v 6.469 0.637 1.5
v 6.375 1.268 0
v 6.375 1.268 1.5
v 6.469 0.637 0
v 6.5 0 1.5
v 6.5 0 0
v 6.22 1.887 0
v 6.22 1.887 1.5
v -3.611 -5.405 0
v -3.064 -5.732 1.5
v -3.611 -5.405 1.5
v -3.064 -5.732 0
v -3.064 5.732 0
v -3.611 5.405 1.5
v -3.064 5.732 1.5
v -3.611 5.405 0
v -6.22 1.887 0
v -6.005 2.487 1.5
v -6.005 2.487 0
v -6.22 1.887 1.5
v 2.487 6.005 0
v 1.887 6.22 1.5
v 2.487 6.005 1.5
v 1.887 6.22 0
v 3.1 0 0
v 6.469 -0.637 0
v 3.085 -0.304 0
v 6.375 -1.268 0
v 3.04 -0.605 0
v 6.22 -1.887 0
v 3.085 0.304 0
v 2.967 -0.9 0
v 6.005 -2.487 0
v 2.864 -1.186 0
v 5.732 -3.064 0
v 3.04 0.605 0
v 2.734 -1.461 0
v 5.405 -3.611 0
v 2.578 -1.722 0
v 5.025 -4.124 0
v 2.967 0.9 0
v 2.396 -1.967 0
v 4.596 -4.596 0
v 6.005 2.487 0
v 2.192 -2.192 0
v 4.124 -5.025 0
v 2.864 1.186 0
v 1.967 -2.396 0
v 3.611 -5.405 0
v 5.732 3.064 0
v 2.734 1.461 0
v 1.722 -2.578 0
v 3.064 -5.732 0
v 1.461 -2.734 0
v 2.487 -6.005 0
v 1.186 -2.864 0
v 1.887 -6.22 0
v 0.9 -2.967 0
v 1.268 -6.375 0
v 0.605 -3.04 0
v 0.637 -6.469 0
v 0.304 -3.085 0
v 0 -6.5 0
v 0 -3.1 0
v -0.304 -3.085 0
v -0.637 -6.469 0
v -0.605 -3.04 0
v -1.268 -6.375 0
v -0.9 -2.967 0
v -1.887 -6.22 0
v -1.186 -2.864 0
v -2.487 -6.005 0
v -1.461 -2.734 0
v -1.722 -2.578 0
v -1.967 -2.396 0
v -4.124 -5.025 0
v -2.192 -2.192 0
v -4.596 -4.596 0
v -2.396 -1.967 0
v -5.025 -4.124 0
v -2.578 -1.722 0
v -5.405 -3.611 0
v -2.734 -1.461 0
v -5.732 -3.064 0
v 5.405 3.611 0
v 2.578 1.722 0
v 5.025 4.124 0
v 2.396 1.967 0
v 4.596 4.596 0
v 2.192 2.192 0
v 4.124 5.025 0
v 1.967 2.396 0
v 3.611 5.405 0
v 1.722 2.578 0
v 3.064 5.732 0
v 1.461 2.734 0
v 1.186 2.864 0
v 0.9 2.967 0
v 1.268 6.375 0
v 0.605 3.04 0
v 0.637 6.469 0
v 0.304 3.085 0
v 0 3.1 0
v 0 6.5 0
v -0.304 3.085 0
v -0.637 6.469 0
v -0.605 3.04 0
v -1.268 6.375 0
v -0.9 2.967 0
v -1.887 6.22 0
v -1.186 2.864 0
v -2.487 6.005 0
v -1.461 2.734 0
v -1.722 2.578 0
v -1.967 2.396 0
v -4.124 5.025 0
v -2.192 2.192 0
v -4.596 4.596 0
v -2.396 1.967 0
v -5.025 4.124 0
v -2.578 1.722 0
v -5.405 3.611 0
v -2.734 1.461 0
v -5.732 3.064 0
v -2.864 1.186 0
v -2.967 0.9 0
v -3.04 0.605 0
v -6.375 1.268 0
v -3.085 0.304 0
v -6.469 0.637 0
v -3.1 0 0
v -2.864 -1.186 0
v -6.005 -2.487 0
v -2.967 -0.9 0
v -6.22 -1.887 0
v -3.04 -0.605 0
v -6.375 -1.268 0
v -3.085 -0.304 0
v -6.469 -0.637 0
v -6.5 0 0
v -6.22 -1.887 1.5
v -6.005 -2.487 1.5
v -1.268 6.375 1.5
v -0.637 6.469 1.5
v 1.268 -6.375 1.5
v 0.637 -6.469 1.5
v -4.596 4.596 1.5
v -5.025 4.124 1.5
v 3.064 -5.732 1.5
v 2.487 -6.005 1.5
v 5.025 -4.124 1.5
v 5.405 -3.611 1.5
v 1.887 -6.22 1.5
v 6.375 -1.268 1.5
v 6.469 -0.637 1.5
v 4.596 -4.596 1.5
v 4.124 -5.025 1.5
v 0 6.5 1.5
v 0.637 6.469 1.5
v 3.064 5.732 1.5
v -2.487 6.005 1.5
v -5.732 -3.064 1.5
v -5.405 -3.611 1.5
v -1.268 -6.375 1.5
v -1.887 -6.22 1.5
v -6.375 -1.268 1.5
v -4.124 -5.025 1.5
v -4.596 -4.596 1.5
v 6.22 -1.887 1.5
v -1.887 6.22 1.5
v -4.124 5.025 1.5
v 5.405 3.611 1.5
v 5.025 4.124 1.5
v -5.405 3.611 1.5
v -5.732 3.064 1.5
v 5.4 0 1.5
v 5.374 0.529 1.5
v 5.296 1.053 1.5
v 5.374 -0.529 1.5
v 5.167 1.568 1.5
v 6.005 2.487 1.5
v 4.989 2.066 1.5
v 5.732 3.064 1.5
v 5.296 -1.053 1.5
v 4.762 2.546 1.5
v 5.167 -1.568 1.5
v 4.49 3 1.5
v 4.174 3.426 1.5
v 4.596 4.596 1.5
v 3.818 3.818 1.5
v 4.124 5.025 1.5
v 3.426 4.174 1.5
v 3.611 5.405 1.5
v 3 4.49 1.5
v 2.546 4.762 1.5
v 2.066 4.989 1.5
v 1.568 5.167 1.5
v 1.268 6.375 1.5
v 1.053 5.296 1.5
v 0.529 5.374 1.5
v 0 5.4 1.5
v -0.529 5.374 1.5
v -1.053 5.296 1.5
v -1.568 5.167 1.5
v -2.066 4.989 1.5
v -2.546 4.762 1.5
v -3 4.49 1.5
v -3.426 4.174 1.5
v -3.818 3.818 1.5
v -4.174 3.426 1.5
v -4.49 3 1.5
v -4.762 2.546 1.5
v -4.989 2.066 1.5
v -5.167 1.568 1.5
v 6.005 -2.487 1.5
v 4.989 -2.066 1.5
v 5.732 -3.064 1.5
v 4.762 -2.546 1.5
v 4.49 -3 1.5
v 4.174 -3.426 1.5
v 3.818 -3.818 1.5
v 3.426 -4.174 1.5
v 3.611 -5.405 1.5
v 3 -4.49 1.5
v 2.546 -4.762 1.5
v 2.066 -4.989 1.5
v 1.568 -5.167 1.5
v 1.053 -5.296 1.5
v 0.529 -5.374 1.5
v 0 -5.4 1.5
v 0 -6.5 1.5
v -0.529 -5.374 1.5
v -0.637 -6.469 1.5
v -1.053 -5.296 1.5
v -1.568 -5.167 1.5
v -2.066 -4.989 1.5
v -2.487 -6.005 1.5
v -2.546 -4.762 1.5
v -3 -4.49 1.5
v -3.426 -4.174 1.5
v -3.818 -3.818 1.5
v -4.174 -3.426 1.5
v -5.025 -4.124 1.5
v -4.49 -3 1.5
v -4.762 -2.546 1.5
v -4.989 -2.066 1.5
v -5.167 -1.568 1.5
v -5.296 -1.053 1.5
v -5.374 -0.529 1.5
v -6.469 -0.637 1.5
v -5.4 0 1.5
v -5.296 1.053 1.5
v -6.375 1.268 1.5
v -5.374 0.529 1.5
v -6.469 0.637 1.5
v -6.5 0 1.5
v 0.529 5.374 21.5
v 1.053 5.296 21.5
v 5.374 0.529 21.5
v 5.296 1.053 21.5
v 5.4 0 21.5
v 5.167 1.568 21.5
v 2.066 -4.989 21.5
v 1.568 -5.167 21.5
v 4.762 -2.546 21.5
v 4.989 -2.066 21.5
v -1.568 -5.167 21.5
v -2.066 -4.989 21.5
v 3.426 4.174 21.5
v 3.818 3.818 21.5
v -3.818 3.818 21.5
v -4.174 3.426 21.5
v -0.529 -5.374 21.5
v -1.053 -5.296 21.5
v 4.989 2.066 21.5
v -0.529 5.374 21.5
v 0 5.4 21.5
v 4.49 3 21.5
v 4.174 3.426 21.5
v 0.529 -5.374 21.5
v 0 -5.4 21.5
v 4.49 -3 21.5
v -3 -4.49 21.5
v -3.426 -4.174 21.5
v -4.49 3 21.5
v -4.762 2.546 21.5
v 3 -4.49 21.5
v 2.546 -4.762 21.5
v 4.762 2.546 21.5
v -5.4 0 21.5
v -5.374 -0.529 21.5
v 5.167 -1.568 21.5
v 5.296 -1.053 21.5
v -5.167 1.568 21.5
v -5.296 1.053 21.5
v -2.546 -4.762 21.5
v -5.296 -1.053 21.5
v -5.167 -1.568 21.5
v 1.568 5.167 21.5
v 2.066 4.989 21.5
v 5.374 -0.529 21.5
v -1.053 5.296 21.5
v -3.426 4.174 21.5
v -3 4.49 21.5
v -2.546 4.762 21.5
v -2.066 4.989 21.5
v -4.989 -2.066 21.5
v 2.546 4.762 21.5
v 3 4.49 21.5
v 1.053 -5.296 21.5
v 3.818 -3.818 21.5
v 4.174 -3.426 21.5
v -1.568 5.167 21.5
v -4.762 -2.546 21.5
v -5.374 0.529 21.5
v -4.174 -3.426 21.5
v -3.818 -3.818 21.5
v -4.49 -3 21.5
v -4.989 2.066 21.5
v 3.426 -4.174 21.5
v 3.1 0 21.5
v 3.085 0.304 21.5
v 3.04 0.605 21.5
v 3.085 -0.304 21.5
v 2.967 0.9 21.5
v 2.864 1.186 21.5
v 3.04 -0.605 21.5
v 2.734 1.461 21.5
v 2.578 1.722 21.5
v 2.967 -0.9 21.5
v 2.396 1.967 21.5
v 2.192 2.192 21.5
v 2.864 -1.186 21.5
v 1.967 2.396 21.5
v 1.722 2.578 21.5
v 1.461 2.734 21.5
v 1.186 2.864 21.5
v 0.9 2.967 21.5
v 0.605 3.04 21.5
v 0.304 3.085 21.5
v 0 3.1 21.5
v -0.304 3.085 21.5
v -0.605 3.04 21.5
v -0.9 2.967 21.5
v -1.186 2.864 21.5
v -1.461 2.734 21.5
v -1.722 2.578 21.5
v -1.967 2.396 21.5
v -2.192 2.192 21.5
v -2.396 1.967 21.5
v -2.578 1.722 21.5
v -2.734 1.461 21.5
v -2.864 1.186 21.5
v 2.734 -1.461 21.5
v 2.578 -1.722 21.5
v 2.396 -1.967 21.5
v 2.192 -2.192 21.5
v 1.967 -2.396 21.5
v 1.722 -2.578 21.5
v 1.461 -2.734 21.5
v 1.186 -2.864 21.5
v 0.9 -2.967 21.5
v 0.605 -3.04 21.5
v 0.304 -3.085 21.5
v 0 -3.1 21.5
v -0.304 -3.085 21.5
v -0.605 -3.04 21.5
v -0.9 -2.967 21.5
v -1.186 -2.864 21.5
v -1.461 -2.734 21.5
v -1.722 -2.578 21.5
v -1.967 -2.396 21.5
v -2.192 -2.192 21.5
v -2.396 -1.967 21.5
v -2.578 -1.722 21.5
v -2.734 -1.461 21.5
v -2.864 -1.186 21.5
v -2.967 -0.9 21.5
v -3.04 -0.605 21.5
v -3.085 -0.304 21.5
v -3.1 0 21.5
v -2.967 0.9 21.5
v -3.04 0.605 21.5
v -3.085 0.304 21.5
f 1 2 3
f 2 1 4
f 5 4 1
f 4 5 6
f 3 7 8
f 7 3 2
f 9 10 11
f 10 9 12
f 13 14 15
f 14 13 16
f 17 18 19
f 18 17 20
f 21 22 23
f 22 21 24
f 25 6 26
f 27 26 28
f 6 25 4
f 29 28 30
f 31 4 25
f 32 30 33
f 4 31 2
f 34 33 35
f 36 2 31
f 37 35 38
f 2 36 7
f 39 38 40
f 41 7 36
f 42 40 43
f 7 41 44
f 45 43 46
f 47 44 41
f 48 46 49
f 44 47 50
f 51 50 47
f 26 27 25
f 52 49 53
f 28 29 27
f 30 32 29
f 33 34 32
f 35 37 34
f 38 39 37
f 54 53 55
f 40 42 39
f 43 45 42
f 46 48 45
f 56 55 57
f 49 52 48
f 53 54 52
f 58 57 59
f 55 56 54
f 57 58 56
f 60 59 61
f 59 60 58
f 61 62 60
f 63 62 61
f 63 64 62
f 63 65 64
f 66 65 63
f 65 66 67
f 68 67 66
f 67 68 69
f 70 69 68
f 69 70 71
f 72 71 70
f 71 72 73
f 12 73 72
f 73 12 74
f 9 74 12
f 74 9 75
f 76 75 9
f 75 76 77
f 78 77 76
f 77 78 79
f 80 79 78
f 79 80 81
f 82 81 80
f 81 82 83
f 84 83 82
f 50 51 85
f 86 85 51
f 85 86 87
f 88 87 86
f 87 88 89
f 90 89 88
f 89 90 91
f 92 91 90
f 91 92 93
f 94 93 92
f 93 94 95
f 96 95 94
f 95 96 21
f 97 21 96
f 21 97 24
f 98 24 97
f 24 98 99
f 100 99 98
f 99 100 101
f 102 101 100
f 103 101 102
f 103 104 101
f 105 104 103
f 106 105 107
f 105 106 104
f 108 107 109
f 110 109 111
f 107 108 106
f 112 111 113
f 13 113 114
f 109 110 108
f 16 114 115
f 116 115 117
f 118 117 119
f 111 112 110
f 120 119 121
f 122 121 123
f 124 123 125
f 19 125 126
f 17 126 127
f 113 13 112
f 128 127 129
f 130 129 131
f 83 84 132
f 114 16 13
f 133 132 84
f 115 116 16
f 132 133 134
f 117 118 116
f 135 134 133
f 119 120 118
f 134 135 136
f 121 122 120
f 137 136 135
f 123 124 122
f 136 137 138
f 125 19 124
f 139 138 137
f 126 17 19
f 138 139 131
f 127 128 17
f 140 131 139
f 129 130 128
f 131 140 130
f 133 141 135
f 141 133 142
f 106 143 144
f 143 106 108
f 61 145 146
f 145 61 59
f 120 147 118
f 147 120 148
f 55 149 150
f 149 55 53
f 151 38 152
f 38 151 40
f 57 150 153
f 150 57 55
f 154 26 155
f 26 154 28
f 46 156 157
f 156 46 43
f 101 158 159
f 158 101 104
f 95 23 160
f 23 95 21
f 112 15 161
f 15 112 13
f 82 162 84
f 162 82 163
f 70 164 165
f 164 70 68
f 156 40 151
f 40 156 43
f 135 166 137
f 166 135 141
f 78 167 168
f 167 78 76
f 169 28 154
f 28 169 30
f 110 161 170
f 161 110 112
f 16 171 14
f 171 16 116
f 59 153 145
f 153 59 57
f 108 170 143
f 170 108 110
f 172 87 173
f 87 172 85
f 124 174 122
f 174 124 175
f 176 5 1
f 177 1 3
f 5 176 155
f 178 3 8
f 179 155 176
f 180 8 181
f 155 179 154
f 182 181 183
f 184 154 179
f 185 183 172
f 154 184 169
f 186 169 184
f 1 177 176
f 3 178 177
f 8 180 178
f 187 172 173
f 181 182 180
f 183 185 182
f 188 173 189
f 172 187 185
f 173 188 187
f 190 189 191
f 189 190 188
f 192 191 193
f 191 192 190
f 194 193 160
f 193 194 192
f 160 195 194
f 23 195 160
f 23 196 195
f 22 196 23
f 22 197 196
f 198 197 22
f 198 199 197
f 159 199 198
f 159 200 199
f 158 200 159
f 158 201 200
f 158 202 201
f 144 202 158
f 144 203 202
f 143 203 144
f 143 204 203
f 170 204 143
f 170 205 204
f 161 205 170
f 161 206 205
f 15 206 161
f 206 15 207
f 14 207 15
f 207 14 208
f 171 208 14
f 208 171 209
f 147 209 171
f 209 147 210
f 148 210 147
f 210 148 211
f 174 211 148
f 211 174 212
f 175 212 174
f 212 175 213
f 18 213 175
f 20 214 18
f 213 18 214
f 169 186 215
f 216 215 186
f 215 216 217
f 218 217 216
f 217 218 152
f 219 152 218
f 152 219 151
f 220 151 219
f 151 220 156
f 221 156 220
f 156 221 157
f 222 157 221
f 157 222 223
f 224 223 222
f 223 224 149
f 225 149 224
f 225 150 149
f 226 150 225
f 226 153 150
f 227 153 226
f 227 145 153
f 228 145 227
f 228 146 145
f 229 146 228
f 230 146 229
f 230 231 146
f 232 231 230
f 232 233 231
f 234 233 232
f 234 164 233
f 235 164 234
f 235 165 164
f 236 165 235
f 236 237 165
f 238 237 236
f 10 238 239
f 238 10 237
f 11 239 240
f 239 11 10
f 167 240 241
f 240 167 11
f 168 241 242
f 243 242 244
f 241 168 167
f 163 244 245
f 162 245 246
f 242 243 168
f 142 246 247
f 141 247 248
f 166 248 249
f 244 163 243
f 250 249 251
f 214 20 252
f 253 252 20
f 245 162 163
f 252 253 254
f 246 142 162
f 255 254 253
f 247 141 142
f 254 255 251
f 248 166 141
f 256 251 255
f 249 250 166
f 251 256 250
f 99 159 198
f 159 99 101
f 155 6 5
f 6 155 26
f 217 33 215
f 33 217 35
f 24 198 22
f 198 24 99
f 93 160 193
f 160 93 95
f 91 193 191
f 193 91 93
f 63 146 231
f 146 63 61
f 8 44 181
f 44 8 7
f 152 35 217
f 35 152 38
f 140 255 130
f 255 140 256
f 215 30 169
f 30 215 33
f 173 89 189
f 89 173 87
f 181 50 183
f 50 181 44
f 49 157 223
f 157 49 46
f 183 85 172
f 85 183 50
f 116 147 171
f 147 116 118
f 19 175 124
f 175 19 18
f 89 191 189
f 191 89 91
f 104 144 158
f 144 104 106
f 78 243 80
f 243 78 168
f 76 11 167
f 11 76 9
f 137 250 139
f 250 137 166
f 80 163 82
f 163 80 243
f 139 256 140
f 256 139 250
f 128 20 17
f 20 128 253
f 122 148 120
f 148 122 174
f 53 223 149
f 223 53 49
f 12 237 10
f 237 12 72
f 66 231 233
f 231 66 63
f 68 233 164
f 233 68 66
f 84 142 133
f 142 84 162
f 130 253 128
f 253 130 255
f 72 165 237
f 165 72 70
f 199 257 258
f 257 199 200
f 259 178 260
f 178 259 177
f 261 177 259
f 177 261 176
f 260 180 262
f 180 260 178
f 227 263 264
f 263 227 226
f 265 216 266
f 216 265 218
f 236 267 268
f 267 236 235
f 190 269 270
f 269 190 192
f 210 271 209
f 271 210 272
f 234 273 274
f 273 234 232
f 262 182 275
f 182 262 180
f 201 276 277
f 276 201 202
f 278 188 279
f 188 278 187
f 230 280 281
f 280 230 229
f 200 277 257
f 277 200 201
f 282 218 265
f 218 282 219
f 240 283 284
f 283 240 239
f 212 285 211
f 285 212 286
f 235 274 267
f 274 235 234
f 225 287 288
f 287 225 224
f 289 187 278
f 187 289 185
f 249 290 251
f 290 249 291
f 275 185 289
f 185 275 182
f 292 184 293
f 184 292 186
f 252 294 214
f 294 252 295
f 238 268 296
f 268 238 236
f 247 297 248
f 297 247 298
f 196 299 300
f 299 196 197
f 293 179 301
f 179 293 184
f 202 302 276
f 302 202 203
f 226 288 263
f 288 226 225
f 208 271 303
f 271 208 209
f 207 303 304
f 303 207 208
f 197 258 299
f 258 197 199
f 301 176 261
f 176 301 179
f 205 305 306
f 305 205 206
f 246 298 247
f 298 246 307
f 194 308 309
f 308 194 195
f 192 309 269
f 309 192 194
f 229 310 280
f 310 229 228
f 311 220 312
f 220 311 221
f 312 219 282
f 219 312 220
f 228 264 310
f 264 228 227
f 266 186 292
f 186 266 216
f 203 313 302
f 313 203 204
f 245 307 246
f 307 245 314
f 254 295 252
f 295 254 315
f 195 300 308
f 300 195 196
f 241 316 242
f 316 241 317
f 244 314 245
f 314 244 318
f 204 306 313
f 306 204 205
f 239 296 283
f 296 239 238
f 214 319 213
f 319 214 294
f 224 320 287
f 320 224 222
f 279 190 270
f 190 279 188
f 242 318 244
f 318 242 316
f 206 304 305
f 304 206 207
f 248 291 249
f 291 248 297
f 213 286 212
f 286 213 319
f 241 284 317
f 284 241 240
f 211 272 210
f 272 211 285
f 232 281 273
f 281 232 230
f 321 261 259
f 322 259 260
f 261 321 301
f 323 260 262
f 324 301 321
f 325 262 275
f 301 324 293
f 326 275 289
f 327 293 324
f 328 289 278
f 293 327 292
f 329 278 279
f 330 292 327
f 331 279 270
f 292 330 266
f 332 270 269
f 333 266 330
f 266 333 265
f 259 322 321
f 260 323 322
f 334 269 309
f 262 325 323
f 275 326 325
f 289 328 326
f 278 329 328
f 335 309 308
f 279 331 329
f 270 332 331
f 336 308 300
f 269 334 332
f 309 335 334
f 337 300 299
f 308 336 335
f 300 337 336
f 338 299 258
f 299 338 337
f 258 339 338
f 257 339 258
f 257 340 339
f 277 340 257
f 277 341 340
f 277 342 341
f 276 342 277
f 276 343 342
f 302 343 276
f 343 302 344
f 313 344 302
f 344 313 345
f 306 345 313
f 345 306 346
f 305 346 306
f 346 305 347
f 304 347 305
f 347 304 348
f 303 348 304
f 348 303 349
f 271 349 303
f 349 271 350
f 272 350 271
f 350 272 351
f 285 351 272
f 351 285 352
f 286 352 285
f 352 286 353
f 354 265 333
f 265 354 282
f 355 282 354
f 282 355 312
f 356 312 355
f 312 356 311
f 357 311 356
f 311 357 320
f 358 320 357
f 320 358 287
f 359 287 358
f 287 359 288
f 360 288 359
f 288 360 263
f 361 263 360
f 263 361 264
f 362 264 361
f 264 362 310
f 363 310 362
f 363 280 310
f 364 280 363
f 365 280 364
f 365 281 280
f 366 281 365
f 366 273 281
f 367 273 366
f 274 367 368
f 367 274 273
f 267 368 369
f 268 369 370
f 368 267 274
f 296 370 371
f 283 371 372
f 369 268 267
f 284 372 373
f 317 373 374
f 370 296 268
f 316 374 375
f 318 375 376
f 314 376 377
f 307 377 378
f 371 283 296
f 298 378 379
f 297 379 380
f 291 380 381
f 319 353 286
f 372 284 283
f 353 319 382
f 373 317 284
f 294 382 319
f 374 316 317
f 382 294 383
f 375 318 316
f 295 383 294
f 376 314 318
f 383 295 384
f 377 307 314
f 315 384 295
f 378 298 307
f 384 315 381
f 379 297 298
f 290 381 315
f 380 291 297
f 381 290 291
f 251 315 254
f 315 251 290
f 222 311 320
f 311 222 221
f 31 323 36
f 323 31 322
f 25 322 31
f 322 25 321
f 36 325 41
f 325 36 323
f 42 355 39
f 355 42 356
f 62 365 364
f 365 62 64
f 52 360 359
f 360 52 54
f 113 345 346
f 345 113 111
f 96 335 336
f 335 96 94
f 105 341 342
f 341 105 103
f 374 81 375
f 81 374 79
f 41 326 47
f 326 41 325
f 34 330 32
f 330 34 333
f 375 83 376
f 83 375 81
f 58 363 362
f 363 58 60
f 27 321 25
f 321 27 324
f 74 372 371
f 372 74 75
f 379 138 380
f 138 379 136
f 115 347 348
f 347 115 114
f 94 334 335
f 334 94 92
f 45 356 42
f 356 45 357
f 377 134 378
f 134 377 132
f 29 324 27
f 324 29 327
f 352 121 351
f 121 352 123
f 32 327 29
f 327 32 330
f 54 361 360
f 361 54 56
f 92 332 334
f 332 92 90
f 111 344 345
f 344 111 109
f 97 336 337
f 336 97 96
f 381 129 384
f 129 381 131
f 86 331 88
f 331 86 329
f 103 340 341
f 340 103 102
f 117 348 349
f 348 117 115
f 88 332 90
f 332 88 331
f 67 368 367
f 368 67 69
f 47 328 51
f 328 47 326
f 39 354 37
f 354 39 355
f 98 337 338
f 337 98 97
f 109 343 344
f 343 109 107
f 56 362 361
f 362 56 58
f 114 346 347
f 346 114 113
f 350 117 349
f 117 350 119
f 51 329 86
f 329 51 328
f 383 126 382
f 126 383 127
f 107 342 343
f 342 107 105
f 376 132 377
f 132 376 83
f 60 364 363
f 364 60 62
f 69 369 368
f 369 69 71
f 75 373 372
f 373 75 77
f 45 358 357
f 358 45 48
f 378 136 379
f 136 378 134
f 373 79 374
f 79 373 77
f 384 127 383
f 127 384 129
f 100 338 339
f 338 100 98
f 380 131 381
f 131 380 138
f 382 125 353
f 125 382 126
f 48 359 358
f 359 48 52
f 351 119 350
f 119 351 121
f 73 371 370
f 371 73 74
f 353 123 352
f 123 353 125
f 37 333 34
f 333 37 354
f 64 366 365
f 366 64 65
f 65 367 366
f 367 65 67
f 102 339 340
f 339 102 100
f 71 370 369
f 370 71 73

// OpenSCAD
// Adapter sleeve: 0.2 mL PCR tube in a 1.5 mL rack hole
// Print orientation: collar on bed (z = 0), sleeve body rises to z = 21.5

$fn = 64;

// --- Dimensions (mm) ---
collar_d      = 13;    // collar outer diameter
collar_h      = 1.5;   // collar thickness (z = 0 to 1.5)
sleeve_od     = 10.8;  // sleeve body outer diameter
sleeve_h      = 20;    // sleeve body height above collar (z = 1.5 to 21.5)
bore_d        = 6.2;   // straight through-bore diameter
eps           = 0.5;   // cutter overshoot past faces

total_h = collar_h + sleeve_h; // 21.5 mm overall height

difference() {
    union() {
        // Collar
        cylinder(d = collar_d, h = collar_h);
        // Sleeve body (slightly overlapping the collar for a clean union)
        translate([0, 0, collar_h - 0.01])
            cylinder(d = sleeve_od, h = sleeve_h + 0.01);
    }
    // Full-height bore, open at both ends
    translate([0, 0, -eps])
        cylinder(d = bore_d, h = total_h + 2 * eps);
}
